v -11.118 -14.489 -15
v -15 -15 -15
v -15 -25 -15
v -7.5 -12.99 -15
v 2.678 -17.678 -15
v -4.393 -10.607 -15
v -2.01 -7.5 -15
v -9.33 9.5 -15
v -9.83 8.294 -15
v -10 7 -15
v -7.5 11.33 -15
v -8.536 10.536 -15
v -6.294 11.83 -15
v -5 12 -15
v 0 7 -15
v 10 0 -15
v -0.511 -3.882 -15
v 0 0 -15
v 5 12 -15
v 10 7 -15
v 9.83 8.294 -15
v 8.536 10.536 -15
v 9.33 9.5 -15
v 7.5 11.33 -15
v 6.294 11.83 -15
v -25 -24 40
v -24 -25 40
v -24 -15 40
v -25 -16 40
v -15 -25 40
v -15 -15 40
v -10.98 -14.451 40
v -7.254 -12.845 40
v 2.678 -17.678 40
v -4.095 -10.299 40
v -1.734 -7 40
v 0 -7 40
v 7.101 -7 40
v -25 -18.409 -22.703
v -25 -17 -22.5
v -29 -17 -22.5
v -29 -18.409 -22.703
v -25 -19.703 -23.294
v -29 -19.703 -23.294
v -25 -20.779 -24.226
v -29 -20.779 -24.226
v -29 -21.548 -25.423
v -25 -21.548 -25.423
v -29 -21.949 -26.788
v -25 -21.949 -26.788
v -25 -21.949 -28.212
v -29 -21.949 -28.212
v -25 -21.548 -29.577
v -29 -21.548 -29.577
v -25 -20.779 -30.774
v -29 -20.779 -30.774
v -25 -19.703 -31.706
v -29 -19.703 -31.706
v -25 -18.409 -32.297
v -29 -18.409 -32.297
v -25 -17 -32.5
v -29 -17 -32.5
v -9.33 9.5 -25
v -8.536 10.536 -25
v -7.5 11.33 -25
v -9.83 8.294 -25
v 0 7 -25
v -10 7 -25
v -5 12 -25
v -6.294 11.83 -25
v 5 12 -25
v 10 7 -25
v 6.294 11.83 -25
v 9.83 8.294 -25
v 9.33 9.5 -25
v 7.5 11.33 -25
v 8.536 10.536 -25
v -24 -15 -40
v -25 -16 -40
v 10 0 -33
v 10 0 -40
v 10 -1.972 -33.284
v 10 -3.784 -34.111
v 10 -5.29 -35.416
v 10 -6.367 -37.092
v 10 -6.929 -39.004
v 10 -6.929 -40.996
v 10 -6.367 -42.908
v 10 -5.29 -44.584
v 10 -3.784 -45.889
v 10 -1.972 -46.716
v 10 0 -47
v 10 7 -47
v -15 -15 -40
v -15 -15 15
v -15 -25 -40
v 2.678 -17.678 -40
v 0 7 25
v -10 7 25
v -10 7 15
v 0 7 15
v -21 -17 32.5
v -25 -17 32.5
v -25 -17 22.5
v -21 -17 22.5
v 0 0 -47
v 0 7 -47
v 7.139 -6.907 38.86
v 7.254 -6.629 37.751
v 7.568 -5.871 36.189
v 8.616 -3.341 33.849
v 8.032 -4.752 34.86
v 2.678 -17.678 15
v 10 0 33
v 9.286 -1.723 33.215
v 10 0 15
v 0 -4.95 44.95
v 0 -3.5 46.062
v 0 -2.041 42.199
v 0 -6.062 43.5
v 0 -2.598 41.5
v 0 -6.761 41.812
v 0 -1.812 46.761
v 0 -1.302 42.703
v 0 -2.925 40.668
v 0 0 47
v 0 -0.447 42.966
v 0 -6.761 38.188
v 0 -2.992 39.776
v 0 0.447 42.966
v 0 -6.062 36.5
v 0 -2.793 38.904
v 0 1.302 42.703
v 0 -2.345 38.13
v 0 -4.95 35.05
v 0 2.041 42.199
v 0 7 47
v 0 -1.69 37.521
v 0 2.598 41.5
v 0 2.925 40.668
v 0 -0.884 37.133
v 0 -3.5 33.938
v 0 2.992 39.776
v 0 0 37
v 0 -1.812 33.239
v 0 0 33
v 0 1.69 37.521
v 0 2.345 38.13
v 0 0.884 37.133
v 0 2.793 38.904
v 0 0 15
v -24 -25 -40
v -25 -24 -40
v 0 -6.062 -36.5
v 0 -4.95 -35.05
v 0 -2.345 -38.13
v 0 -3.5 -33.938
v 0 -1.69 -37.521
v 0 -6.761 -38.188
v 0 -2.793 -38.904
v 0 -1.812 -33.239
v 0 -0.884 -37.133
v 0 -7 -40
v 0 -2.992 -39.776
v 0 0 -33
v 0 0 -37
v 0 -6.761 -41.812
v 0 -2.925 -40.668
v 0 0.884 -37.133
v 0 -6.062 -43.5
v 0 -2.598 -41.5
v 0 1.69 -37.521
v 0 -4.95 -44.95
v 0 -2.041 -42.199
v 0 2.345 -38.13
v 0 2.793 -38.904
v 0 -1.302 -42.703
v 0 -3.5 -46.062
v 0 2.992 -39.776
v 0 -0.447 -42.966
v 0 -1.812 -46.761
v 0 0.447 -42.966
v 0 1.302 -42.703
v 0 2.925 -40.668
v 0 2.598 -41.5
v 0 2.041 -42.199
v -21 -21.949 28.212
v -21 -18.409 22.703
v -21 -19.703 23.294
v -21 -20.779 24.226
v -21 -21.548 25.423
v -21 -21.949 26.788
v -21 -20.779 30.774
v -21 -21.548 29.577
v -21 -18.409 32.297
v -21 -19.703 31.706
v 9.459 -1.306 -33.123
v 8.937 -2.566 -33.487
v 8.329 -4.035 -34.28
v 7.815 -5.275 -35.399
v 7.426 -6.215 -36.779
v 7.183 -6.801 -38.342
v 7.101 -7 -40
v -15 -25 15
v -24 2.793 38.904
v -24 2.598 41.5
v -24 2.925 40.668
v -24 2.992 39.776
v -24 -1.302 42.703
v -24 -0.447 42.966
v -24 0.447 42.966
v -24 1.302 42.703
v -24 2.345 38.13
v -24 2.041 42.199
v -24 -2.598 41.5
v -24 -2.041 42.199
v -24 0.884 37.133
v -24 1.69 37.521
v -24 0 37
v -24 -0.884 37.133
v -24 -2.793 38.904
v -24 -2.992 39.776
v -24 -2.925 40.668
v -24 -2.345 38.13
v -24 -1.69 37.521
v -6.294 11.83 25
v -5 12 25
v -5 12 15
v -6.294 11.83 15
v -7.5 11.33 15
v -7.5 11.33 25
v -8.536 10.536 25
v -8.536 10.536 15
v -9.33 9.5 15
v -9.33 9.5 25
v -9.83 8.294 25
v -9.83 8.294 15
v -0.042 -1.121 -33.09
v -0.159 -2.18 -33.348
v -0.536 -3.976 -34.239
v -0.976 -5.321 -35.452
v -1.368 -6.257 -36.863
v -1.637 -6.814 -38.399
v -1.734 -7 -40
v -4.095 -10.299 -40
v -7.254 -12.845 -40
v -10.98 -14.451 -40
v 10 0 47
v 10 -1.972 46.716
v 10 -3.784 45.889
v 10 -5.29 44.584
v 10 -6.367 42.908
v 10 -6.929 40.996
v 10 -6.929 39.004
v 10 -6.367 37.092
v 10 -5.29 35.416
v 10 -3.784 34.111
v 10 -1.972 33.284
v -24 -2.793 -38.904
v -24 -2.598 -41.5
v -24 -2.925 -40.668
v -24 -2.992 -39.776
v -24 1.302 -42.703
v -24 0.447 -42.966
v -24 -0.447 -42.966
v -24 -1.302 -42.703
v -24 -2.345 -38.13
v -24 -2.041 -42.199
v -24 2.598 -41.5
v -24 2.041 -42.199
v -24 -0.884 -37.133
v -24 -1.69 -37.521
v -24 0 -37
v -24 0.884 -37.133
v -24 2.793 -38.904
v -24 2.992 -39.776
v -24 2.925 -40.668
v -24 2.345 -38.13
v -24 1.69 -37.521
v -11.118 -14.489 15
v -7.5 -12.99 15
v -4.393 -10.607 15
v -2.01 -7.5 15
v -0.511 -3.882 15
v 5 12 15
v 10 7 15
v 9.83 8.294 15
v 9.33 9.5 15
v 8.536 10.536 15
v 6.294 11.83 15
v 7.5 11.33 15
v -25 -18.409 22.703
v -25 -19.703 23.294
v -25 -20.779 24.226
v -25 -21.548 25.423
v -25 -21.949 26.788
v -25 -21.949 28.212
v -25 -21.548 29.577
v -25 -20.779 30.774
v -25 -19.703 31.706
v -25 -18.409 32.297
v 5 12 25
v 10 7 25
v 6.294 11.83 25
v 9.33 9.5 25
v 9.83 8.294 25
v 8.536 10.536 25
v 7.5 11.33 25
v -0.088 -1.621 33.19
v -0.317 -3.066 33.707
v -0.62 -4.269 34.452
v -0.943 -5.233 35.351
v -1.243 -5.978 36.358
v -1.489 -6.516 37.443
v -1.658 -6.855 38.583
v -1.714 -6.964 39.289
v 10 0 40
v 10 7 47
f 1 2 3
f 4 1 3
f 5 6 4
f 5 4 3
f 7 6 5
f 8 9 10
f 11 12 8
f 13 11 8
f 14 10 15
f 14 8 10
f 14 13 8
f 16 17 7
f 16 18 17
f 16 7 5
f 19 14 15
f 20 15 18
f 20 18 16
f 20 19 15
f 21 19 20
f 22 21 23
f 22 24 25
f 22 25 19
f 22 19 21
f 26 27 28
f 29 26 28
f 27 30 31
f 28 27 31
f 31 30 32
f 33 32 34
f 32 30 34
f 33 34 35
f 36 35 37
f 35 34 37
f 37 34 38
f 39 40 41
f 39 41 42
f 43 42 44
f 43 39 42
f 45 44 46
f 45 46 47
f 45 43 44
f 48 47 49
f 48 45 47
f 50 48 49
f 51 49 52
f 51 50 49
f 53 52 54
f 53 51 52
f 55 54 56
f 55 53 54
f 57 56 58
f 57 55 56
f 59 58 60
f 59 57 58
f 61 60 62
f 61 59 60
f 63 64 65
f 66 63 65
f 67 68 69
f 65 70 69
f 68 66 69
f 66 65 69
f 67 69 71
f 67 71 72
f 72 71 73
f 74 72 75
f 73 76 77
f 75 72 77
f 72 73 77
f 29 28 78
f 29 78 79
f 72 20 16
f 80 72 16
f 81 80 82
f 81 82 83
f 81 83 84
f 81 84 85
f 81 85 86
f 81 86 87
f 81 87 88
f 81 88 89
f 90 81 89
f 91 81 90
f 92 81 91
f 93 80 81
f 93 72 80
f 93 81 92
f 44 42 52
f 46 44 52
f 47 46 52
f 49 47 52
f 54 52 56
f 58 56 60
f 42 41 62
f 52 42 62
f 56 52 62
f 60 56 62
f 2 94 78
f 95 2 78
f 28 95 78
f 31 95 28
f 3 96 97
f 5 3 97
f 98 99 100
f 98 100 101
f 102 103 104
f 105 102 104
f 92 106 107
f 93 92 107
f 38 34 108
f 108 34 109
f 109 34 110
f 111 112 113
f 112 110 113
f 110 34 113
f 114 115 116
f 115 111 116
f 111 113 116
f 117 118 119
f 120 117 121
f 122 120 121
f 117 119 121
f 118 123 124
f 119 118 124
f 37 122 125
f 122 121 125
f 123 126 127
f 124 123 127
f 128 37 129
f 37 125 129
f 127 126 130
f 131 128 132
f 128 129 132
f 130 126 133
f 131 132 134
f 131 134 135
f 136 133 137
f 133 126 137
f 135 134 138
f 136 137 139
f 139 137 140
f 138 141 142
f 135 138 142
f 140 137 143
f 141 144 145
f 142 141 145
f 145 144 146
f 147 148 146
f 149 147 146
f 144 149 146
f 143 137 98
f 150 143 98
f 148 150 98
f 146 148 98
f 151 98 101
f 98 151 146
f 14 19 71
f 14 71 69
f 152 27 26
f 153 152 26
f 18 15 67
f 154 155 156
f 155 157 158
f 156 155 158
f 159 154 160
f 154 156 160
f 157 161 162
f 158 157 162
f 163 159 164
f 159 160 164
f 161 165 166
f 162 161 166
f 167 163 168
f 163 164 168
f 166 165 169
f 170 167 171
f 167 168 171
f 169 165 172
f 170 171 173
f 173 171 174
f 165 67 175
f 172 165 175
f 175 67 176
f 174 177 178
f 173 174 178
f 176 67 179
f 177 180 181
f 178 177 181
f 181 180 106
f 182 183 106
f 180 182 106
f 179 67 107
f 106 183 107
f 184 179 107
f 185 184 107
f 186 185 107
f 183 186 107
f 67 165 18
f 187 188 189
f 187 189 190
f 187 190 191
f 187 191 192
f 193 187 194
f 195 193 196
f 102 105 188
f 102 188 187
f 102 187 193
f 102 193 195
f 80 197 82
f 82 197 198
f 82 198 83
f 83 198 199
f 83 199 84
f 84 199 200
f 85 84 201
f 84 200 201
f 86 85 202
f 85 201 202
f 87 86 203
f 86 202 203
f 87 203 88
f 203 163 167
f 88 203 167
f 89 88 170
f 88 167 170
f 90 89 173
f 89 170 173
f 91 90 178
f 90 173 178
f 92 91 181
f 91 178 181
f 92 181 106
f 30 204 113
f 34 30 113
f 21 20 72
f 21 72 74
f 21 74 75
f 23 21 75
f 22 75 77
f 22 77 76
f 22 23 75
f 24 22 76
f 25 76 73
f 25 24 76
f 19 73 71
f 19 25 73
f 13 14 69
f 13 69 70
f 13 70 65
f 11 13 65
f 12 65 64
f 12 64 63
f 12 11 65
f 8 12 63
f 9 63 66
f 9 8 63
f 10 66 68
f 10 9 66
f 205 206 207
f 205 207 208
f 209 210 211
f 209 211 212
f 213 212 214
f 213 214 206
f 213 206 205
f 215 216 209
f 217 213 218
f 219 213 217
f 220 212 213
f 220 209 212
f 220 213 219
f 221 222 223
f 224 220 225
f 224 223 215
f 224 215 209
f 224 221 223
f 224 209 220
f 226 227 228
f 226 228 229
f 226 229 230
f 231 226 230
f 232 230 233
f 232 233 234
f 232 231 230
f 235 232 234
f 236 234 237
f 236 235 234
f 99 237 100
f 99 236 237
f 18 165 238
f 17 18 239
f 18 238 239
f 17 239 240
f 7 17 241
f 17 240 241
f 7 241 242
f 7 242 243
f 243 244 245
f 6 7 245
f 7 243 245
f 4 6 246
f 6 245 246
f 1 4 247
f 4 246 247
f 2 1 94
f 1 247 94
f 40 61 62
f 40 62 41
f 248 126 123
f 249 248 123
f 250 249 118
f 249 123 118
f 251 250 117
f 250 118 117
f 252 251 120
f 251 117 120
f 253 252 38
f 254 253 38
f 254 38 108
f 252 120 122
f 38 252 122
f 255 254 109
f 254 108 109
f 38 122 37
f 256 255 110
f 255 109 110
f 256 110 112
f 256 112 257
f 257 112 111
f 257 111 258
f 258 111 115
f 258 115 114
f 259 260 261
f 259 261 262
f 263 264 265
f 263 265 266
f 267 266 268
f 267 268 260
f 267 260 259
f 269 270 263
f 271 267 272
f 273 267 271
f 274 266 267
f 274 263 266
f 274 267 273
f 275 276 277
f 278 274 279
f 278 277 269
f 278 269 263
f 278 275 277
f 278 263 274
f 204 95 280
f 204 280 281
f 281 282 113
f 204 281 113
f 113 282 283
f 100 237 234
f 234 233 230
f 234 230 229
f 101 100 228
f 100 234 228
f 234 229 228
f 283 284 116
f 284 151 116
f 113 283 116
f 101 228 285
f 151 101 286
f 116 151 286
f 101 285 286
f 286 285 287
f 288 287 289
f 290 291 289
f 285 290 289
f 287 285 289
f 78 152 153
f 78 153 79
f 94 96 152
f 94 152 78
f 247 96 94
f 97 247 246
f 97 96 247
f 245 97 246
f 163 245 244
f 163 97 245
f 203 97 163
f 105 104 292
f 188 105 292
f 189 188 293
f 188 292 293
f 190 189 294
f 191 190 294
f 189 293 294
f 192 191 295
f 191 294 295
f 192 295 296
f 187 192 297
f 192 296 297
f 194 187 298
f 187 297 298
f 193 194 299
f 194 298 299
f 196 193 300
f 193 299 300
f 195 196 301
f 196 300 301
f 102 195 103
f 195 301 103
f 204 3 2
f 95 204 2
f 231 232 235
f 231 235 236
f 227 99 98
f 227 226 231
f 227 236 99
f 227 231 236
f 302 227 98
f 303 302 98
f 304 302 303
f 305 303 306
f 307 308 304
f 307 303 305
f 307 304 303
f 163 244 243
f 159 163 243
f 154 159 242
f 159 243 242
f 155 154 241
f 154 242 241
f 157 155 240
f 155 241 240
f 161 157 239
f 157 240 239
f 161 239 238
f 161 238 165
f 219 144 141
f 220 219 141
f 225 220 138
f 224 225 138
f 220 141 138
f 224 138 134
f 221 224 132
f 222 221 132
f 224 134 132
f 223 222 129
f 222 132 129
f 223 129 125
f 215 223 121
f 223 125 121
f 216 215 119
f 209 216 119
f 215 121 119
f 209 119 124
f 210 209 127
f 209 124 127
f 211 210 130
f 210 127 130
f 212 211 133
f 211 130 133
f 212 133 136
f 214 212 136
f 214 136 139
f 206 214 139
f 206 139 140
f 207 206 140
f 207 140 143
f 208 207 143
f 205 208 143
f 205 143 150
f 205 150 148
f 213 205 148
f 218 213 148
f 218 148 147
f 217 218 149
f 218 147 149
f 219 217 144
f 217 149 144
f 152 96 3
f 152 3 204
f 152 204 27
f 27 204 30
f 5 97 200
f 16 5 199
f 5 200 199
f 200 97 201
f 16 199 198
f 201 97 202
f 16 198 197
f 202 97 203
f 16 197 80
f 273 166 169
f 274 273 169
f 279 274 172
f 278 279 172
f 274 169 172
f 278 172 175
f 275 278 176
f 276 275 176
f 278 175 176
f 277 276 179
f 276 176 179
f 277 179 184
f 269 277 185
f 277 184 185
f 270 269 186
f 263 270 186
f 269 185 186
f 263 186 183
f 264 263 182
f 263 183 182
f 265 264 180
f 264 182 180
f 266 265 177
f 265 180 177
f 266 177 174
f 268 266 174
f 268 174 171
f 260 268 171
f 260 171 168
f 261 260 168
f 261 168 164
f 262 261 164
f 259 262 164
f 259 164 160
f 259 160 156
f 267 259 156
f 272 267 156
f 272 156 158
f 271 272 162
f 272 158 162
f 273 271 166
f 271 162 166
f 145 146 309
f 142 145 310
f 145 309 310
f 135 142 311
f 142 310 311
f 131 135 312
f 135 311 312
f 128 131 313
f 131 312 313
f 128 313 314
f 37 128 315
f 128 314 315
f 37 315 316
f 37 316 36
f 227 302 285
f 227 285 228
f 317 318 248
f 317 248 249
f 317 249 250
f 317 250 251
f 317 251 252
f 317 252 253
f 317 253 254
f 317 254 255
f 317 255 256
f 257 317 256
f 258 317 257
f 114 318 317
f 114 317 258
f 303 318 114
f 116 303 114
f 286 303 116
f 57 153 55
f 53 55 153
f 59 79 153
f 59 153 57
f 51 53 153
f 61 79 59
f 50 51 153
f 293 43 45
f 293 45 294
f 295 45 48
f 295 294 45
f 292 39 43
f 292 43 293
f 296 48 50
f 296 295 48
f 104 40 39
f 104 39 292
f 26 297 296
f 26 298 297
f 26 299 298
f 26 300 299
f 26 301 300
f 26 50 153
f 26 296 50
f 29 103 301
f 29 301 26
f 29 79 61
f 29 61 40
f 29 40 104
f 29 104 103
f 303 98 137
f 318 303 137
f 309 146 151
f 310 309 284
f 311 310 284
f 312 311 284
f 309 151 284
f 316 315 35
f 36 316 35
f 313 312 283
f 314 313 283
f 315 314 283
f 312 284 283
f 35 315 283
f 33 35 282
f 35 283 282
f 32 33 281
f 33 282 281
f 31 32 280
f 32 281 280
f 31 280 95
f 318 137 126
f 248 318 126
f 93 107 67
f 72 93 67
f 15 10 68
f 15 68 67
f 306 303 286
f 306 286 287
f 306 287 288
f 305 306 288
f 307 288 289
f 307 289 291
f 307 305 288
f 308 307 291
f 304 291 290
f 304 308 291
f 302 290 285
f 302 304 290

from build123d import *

# Parameters (mm, degrees)
BOSS_EXTRUDE1_DEPTH   = 10
BOSS_EXTRUDE1_2_DEPTH = 10
BOSS_EXTRUDE2_START   = -7
BOSS_EXTRUDE2_DEPTH   = 80
CUT_EXTRUDE1_START    = 2
CUT_EXTRUDE1_DEPTH    = 2
SKETCH9_W             = 80
SKETCH9_H             = 10
BOSS_EXTRUDE4_DEPTH   = 10
CUT_EXTRUDE3_DEPTH    = 80
CUT_EXTRUDE4_START    = -32
CUT_EXTRUDE4_DEPTH    = 30
SKETCH7_R             = 3
BOSS_EXTRUDE5_DEPTH   = 24
BOSS_EXTRUDE6_DEPTH   = 10
BOSS_EXTRUDE8_START   = 10
BOSS_EXTRUDE8_DEPTH   = 10
BOSS_EXTRUDE3_DEPTH   = 4
CUT_EXTRUDE5_DEPTH    = 4


with BuildPart() as part:
    # Sketch3 → Boss-Extrude1 (new body)
    with BuildSketch(Plane(origin=(0, 0, 0), x_dir=(0, 0, -1), z_dir=(1, 0, 0))):
        with BuildLine():
            Line((-47, 7), (-47, 0))
            ThreePointArc((-47, 0), (-40, -7), (-33, 0))
            Line((-33, 0), (-15, 0))
            Line((-15, 0), (-15, 7))
            Line((-15, 7), (-47, 7))
        make_face()
    extrude(amount=BOSS_EXTRUDE1_DEPTH)

    # Sketch5 → Boss-Extrude2 (add)
    with BuildSketch(Plane(origin=(0, 0, -47), x_dir=(-1, 0, 0), z_dir=(0, 0, -1)).offset(BOSS_EXTRUDE2_START)):
        with BuildLine():
            Line((-10, 0), (0, 0))
            ThreePointArc((0, 0), (4.393398282, -10.606601718), (15, -15))
            Line((15, -15), (15, -25))
            Line((15, -25), (-2.67766953, -17.67766953))
            Line((-2.67766953, -17.67766953), (-10, 0))
        make_face()
    extrude(amount=-BOSS_EXTRUDE2_DEPTH)

    # Sketch6 → Cut-Extrude1 (cut)
    with BuildSketch(Plane.ZY.offset(CUT_EXTRUDE1_START)):
        with BuildLine():
            Line((-33, 0), (-40, 0))
            Line((-40, 0), (-40, -7))
            ThreePointArc((-40, -7), (-35.050252532, -4.949747468), (-33, 0))
        make_face()
        with BuildLine():
            Line((40, 0), (33, 0))
            ThreePointArc((33, 0), (35.050252532, -4.949747468), (40, -7))
            Line((40, -7), (40, 0))
        make_face()
    extrude(amount=-CUT_EXTRUDE1_DEPTH, mode=Mode.SUBTRACT)

    # Sketch9 → Boss-Extrude4 (add)
    with BuildSketch(Plane.ZY.offset(15)):
        with Locations((0, -20)):
            Rectangle(SKETCH9_W, SKETCH9_H)
    extrude(amount=BOSS_EXTRUDE4_DEPTH)

    # Sketch10 → Cut-Extrude3 (cut)
    with BuildSketch(Plane(origin=(0, 0, -40), x_dir=(-1, 0, 0), z_dir=(0, 0, -1))):
        Polygon((25, -15), (24, -15), (25, -16), align=None)
        Polygon((25, -25), (24, -25), (25, -24), align=None)
    extrude(amount=-CUT_EXTRUDE3_DEPTH, mode=Mode.SUBTRACT)

    # Sketch5<3> → Cut-Extrude4 (cut)
    with BuildSketch(Plane(origin=(0, 0, -47), x_dir=(-1, 0, 0), z_dir=(0, 0, -1)).offset(CUT_EXTRUDE4_START)):
        with BuildLine():
            Line((0, 0), (-10, 0))
            Line((-10, 0), (-2.67766953, -17.67766953))
            Line((-2.67766953, -17.67766953), (15, -25))
            Line((15, -25), (15, -15))
            ThreePointArc((15, -15), (4.393398282, -10.606601718), (0, 0))
        make_face()
    extrude(amount=-CUT_EXTRUDE4_DEPTH, mode=Mode.SUBTRACT)



with BuildPart() as body_2:
    # Sketch3 → Boss-Extrude1 2 (new body)
    with BuildSketch(Plane(origin=(0, 0, 0), x_dir=(0, 0, -1), z_dir=(1, 0, 0))):
        with BuildLine():
            Line((15, 7), (15, 0))
            Line((15, 0), (33, 0))
            ThreePointArc((33, 0), (40, -7), (47, 0))
            Line((47, 0), (47, 7))
            Line((47, 7), (15, 7))
        make_face()
    extrude(amount=BOSS_EXTRUDE1_2_DEPTH)


with BuildPart() as part_1:
    add(part.part)

    add(body_2.part)  # Boss-Extrude5 merges body 2
    # Sketch7 → Boss-Extrude5 (add)
    with BuildSketch(Plane.ZY):
        with Locations((-40, 0)):
            Circle(SKETCH7_R)
        with Locations(Location((40, 0, 0), (0, 0, 180))):
            Circle(SKETCH7_R)
    extrude(amount=BOSS_EXTRUDE5_DEPTH)

    # Sketch11 → Boss-Extrude6 (add)
    with BuildSketch(Plane.XY.offset(-15)):
        with BuildLine():
            Line((-10, 7), (0, 7))
            Line((0, 7), (10, 7))
            ThreePointArc((10, 7), (8.535533906, 10.535533906), (5, 12))
            Line((5, 12), (-5, 12))
            ThreePointArc((-5, 12), (-8.535533906, 10.535533906), (-10, 7))
        make_face()
    extrude(amount=-BOSS_EXTRUDE6_DEPTH)

    # Sketch13 → Boss-Extrude8 (add)
    with BuildSketch(Plane.XY.offset(15).offset(BOSS_EXTRUDE8_START)):
        with BuildLine():
            Line((-10, 7), (0, 7))
            Line((0, 7), (10, 7))
            ThreePointArc((10, 7), (8.535533906, 10.535533906), (5, 12))
            Line((5, 12), (-5, 12))
            ThreePointArc((-5, 12), (-8.535533906, 10.535533906), (-10, 7))
        make_face()
    extrude(amount=-BOSS_EXTRUDE8_DEPTH)

    # Sketch8 → Boss-Extrude3 (add)
    with BuildSketch(Plane.ZY.offset(25)):
        with BuildLine():
            Line((-32.5, -17), (-22.5, -17))
            ThreePointArc((-22.5, -17), (-27.5, -22), (-32.5, -17))
        make_face()
    extrude(amount=BOSS_EXTRUDE3_DEPTH)

    # Sketch8<4> → Cut-Extrude5 (cut)
    with BuildSketch(Plane.ZY.offset(25)):
        with BuildLine():
            Line((32.5, -17), (22.5, -17))
            ThreePointArc((22.5, -17), (27.5, -22), (32.5, -17))
        make_face()
    extrude(amount=-CUT_EXTRUDE5_DEPTH, mode=Mode.SUBTRACT)


solid = part_1.part
